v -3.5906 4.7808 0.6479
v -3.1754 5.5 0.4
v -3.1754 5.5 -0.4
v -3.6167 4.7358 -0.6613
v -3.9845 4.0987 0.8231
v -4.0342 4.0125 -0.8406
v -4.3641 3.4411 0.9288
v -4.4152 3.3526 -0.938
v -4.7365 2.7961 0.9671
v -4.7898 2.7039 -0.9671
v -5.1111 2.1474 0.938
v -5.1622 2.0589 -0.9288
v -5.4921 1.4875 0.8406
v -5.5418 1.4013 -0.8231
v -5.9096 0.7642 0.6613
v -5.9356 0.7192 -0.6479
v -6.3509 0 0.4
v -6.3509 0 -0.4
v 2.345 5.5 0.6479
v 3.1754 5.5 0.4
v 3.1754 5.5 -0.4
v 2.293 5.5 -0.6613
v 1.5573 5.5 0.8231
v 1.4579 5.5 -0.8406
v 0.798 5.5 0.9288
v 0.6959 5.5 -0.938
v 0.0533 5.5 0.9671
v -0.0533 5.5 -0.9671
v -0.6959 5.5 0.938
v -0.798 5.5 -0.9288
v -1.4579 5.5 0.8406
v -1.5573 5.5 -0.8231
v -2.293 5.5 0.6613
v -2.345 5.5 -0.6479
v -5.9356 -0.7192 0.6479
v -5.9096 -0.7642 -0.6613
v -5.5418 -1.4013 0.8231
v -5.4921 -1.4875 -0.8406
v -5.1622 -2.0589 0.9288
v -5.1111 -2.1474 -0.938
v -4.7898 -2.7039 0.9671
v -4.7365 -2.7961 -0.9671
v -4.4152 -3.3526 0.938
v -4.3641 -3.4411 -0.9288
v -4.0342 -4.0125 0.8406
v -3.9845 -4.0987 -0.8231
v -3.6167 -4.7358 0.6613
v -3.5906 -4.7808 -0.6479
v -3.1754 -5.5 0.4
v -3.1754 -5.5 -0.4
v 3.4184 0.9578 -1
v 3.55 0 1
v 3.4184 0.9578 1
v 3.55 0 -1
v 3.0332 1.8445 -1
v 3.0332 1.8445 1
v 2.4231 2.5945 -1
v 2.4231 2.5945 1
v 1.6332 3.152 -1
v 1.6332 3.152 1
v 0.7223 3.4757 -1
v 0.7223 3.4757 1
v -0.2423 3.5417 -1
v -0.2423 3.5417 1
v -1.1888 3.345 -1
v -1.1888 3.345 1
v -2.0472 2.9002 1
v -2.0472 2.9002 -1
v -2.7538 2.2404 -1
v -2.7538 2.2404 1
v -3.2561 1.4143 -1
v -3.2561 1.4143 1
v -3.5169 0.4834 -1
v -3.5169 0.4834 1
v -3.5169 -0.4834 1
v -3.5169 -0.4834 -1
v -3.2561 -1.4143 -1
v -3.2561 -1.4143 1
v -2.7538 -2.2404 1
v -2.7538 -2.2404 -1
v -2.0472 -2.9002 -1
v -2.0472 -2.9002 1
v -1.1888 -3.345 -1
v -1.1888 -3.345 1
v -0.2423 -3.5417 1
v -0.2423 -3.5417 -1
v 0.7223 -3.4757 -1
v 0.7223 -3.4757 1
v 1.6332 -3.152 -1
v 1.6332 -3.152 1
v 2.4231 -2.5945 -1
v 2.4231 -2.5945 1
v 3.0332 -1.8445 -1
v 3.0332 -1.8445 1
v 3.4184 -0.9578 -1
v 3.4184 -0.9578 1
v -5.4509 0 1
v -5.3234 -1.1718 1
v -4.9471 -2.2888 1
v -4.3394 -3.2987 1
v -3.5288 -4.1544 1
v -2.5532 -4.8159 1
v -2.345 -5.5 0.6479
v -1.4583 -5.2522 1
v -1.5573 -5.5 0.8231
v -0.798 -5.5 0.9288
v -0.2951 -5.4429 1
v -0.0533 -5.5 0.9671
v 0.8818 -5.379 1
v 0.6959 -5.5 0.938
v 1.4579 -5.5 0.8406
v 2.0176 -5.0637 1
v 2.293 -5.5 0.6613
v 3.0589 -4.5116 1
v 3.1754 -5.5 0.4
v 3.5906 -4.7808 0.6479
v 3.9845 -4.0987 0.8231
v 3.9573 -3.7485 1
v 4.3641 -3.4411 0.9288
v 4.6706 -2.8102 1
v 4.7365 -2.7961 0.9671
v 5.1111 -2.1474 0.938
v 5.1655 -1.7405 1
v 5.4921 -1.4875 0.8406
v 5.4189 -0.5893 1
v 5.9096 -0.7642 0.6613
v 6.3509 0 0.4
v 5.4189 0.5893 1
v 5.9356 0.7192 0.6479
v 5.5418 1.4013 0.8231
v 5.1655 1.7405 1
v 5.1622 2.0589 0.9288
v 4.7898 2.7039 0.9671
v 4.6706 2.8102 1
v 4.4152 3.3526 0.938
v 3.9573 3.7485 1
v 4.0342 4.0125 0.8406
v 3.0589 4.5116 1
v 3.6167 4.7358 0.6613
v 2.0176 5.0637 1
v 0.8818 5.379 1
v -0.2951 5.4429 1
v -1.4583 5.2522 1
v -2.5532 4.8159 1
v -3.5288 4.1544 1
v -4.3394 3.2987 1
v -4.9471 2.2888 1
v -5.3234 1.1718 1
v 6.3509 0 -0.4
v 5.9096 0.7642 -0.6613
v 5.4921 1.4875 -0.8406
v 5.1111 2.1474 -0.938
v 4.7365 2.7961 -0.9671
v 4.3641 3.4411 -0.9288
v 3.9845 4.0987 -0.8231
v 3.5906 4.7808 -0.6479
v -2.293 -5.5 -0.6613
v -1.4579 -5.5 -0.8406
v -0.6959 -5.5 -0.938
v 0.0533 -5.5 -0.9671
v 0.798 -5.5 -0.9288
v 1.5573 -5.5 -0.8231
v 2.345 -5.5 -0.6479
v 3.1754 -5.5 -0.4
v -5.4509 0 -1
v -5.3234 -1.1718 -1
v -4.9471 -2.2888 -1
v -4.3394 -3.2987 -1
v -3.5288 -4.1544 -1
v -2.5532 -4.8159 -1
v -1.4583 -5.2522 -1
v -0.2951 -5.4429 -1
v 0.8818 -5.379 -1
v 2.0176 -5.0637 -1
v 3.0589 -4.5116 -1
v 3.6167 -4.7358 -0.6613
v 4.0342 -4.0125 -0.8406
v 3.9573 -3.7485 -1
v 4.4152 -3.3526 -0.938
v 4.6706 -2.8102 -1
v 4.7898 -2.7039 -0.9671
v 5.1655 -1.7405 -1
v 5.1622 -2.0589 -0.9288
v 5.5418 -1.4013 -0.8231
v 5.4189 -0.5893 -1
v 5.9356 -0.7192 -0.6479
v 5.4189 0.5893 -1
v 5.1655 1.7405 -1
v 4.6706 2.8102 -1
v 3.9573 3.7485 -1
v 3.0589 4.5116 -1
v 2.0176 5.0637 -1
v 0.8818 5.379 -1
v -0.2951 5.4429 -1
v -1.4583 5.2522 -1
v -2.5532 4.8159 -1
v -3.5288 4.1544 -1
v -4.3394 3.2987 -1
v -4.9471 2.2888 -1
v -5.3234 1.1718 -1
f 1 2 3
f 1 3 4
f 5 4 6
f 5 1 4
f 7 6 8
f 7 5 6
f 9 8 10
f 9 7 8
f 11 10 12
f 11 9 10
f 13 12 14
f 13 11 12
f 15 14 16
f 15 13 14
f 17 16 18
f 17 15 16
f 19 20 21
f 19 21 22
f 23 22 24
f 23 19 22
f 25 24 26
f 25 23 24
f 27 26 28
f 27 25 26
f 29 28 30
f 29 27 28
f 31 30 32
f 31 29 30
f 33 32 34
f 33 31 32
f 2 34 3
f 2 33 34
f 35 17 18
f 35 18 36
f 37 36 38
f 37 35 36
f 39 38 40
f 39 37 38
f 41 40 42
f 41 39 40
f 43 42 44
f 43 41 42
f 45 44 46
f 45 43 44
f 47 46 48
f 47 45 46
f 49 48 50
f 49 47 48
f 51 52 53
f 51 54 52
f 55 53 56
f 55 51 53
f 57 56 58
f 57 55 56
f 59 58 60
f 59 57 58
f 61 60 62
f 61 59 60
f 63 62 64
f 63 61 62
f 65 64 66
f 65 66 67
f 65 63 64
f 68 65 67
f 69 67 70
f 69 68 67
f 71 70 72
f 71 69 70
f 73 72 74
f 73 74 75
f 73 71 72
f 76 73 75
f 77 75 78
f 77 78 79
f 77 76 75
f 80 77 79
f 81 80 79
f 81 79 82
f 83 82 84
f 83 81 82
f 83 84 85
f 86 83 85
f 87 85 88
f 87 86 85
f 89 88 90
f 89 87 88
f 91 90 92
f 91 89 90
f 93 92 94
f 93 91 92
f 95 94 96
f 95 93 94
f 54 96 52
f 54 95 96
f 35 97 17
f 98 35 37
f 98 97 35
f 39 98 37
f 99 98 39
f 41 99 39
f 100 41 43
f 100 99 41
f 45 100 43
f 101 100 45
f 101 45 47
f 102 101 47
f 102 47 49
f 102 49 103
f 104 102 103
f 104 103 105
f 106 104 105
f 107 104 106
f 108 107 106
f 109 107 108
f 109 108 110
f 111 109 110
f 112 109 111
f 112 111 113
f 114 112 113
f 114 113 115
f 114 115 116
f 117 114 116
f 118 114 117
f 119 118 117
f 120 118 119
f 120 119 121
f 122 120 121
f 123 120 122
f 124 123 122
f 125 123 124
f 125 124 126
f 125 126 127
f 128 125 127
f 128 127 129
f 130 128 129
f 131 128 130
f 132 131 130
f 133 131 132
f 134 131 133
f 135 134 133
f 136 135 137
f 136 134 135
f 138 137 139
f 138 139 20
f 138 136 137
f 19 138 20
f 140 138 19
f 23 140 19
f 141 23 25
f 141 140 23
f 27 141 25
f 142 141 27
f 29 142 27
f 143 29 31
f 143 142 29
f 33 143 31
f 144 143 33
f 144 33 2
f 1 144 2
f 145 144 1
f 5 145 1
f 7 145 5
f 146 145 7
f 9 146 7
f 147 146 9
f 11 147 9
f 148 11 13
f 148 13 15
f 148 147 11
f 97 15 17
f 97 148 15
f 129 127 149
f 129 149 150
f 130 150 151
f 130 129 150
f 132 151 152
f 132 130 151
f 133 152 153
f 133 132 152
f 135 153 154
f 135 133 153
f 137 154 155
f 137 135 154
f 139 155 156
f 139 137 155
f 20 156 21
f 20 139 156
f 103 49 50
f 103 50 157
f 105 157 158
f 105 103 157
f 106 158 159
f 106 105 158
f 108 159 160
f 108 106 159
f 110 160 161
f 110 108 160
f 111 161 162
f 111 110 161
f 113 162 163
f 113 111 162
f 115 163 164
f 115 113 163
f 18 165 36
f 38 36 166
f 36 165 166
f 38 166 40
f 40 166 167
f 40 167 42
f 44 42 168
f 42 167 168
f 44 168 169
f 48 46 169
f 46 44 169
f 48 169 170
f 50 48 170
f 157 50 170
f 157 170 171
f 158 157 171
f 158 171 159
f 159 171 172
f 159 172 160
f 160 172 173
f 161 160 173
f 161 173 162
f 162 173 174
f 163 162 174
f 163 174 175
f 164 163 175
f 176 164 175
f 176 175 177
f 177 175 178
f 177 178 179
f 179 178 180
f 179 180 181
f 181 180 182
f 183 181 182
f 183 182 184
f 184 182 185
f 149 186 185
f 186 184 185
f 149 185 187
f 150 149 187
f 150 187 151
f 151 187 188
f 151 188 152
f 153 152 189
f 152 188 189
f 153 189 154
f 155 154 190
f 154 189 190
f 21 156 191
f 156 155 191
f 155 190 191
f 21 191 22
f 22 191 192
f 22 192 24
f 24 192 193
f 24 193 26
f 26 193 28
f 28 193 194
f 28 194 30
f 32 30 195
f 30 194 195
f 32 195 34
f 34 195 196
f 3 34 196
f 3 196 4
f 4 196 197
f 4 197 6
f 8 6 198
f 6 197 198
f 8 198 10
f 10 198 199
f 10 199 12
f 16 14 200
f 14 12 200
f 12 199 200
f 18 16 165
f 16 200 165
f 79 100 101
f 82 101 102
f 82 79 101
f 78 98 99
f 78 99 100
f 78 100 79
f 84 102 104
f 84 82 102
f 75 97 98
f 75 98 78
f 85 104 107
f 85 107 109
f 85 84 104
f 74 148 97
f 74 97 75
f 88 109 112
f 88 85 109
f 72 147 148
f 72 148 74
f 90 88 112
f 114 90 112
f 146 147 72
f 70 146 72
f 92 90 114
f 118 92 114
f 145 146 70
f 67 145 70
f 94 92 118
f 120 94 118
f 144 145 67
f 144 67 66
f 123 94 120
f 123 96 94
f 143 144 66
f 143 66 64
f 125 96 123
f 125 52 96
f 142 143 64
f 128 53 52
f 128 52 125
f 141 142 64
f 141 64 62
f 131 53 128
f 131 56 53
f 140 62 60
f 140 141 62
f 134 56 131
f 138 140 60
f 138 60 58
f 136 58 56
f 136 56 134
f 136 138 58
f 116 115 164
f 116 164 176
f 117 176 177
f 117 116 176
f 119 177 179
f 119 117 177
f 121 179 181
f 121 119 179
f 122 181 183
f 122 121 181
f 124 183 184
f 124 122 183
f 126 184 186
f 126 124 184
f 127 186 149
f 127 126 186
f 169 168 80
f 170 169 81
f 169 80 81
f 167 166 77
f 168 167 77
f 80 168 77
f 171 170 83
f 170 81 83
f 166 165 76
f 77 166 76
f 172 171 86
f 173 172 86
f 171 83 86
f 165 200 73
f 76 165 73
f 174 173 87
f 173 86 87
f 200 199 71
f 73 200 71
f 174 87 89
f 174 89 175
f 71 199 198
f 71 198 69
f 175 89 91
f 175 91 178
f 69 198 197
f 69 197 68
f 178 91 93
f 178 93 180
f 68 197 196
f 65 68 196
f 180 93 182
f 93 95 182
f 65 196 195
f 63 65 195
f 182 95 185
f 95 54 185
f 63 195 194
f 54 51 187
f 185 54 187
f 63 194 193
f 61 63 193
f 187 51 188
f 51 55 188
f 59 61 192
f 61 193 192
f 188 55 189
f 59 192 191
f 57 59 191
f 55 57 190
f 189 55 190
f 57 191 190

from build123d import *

# Parameters (mm, degrees)
ESQUISSE1_R        = 3.55
BOSS_EXTRU_1_DEPTH = 1


with BuildPart() as part:
    # Esquisse1 → Boss.-Extru.1 (new, symmetric)
    with BuildSketch(Plane.XY):
        Polygon((3.175426481, -5.5), (6.350852961, 0), (3.175426481, 5.5), (-3.175426481, 5.5), (-6.350852961, 0), (-3.175426481, -5.5), align=None)
        Circle(ESQUISSE1_R, mode=Mode.SUBTRACT)
    extrude(amount=BOSS_EXTRU_1_DEPTH, both=True)

    # Esquisse2 → Enlèvement de matière-Révolution1 (revolve, cut)
    with BuildSketch(Plane(origin=(0, 0, 0), x_dir=(1, 0, 0), z_dir=(0, 1, 0))):
        Polygon((-6.350852961, -0.4), (-5.450852961, -1), (-6.350852961, -1), align=None)
    enl_vement_de_mati_re_r_volution1 = revolve(axis=Axis((0, 0, -0.1), (0, 0, 1)), mode=Mode.SUBTRACT)

    # Symétrie2: Enlèvement de matière-Révolution1 across plane
    add(enl_vement_de_mati_re_r_volution1.mirror(Plane.XY), mode=Mode.SUBTRACT)


solid = part.part
